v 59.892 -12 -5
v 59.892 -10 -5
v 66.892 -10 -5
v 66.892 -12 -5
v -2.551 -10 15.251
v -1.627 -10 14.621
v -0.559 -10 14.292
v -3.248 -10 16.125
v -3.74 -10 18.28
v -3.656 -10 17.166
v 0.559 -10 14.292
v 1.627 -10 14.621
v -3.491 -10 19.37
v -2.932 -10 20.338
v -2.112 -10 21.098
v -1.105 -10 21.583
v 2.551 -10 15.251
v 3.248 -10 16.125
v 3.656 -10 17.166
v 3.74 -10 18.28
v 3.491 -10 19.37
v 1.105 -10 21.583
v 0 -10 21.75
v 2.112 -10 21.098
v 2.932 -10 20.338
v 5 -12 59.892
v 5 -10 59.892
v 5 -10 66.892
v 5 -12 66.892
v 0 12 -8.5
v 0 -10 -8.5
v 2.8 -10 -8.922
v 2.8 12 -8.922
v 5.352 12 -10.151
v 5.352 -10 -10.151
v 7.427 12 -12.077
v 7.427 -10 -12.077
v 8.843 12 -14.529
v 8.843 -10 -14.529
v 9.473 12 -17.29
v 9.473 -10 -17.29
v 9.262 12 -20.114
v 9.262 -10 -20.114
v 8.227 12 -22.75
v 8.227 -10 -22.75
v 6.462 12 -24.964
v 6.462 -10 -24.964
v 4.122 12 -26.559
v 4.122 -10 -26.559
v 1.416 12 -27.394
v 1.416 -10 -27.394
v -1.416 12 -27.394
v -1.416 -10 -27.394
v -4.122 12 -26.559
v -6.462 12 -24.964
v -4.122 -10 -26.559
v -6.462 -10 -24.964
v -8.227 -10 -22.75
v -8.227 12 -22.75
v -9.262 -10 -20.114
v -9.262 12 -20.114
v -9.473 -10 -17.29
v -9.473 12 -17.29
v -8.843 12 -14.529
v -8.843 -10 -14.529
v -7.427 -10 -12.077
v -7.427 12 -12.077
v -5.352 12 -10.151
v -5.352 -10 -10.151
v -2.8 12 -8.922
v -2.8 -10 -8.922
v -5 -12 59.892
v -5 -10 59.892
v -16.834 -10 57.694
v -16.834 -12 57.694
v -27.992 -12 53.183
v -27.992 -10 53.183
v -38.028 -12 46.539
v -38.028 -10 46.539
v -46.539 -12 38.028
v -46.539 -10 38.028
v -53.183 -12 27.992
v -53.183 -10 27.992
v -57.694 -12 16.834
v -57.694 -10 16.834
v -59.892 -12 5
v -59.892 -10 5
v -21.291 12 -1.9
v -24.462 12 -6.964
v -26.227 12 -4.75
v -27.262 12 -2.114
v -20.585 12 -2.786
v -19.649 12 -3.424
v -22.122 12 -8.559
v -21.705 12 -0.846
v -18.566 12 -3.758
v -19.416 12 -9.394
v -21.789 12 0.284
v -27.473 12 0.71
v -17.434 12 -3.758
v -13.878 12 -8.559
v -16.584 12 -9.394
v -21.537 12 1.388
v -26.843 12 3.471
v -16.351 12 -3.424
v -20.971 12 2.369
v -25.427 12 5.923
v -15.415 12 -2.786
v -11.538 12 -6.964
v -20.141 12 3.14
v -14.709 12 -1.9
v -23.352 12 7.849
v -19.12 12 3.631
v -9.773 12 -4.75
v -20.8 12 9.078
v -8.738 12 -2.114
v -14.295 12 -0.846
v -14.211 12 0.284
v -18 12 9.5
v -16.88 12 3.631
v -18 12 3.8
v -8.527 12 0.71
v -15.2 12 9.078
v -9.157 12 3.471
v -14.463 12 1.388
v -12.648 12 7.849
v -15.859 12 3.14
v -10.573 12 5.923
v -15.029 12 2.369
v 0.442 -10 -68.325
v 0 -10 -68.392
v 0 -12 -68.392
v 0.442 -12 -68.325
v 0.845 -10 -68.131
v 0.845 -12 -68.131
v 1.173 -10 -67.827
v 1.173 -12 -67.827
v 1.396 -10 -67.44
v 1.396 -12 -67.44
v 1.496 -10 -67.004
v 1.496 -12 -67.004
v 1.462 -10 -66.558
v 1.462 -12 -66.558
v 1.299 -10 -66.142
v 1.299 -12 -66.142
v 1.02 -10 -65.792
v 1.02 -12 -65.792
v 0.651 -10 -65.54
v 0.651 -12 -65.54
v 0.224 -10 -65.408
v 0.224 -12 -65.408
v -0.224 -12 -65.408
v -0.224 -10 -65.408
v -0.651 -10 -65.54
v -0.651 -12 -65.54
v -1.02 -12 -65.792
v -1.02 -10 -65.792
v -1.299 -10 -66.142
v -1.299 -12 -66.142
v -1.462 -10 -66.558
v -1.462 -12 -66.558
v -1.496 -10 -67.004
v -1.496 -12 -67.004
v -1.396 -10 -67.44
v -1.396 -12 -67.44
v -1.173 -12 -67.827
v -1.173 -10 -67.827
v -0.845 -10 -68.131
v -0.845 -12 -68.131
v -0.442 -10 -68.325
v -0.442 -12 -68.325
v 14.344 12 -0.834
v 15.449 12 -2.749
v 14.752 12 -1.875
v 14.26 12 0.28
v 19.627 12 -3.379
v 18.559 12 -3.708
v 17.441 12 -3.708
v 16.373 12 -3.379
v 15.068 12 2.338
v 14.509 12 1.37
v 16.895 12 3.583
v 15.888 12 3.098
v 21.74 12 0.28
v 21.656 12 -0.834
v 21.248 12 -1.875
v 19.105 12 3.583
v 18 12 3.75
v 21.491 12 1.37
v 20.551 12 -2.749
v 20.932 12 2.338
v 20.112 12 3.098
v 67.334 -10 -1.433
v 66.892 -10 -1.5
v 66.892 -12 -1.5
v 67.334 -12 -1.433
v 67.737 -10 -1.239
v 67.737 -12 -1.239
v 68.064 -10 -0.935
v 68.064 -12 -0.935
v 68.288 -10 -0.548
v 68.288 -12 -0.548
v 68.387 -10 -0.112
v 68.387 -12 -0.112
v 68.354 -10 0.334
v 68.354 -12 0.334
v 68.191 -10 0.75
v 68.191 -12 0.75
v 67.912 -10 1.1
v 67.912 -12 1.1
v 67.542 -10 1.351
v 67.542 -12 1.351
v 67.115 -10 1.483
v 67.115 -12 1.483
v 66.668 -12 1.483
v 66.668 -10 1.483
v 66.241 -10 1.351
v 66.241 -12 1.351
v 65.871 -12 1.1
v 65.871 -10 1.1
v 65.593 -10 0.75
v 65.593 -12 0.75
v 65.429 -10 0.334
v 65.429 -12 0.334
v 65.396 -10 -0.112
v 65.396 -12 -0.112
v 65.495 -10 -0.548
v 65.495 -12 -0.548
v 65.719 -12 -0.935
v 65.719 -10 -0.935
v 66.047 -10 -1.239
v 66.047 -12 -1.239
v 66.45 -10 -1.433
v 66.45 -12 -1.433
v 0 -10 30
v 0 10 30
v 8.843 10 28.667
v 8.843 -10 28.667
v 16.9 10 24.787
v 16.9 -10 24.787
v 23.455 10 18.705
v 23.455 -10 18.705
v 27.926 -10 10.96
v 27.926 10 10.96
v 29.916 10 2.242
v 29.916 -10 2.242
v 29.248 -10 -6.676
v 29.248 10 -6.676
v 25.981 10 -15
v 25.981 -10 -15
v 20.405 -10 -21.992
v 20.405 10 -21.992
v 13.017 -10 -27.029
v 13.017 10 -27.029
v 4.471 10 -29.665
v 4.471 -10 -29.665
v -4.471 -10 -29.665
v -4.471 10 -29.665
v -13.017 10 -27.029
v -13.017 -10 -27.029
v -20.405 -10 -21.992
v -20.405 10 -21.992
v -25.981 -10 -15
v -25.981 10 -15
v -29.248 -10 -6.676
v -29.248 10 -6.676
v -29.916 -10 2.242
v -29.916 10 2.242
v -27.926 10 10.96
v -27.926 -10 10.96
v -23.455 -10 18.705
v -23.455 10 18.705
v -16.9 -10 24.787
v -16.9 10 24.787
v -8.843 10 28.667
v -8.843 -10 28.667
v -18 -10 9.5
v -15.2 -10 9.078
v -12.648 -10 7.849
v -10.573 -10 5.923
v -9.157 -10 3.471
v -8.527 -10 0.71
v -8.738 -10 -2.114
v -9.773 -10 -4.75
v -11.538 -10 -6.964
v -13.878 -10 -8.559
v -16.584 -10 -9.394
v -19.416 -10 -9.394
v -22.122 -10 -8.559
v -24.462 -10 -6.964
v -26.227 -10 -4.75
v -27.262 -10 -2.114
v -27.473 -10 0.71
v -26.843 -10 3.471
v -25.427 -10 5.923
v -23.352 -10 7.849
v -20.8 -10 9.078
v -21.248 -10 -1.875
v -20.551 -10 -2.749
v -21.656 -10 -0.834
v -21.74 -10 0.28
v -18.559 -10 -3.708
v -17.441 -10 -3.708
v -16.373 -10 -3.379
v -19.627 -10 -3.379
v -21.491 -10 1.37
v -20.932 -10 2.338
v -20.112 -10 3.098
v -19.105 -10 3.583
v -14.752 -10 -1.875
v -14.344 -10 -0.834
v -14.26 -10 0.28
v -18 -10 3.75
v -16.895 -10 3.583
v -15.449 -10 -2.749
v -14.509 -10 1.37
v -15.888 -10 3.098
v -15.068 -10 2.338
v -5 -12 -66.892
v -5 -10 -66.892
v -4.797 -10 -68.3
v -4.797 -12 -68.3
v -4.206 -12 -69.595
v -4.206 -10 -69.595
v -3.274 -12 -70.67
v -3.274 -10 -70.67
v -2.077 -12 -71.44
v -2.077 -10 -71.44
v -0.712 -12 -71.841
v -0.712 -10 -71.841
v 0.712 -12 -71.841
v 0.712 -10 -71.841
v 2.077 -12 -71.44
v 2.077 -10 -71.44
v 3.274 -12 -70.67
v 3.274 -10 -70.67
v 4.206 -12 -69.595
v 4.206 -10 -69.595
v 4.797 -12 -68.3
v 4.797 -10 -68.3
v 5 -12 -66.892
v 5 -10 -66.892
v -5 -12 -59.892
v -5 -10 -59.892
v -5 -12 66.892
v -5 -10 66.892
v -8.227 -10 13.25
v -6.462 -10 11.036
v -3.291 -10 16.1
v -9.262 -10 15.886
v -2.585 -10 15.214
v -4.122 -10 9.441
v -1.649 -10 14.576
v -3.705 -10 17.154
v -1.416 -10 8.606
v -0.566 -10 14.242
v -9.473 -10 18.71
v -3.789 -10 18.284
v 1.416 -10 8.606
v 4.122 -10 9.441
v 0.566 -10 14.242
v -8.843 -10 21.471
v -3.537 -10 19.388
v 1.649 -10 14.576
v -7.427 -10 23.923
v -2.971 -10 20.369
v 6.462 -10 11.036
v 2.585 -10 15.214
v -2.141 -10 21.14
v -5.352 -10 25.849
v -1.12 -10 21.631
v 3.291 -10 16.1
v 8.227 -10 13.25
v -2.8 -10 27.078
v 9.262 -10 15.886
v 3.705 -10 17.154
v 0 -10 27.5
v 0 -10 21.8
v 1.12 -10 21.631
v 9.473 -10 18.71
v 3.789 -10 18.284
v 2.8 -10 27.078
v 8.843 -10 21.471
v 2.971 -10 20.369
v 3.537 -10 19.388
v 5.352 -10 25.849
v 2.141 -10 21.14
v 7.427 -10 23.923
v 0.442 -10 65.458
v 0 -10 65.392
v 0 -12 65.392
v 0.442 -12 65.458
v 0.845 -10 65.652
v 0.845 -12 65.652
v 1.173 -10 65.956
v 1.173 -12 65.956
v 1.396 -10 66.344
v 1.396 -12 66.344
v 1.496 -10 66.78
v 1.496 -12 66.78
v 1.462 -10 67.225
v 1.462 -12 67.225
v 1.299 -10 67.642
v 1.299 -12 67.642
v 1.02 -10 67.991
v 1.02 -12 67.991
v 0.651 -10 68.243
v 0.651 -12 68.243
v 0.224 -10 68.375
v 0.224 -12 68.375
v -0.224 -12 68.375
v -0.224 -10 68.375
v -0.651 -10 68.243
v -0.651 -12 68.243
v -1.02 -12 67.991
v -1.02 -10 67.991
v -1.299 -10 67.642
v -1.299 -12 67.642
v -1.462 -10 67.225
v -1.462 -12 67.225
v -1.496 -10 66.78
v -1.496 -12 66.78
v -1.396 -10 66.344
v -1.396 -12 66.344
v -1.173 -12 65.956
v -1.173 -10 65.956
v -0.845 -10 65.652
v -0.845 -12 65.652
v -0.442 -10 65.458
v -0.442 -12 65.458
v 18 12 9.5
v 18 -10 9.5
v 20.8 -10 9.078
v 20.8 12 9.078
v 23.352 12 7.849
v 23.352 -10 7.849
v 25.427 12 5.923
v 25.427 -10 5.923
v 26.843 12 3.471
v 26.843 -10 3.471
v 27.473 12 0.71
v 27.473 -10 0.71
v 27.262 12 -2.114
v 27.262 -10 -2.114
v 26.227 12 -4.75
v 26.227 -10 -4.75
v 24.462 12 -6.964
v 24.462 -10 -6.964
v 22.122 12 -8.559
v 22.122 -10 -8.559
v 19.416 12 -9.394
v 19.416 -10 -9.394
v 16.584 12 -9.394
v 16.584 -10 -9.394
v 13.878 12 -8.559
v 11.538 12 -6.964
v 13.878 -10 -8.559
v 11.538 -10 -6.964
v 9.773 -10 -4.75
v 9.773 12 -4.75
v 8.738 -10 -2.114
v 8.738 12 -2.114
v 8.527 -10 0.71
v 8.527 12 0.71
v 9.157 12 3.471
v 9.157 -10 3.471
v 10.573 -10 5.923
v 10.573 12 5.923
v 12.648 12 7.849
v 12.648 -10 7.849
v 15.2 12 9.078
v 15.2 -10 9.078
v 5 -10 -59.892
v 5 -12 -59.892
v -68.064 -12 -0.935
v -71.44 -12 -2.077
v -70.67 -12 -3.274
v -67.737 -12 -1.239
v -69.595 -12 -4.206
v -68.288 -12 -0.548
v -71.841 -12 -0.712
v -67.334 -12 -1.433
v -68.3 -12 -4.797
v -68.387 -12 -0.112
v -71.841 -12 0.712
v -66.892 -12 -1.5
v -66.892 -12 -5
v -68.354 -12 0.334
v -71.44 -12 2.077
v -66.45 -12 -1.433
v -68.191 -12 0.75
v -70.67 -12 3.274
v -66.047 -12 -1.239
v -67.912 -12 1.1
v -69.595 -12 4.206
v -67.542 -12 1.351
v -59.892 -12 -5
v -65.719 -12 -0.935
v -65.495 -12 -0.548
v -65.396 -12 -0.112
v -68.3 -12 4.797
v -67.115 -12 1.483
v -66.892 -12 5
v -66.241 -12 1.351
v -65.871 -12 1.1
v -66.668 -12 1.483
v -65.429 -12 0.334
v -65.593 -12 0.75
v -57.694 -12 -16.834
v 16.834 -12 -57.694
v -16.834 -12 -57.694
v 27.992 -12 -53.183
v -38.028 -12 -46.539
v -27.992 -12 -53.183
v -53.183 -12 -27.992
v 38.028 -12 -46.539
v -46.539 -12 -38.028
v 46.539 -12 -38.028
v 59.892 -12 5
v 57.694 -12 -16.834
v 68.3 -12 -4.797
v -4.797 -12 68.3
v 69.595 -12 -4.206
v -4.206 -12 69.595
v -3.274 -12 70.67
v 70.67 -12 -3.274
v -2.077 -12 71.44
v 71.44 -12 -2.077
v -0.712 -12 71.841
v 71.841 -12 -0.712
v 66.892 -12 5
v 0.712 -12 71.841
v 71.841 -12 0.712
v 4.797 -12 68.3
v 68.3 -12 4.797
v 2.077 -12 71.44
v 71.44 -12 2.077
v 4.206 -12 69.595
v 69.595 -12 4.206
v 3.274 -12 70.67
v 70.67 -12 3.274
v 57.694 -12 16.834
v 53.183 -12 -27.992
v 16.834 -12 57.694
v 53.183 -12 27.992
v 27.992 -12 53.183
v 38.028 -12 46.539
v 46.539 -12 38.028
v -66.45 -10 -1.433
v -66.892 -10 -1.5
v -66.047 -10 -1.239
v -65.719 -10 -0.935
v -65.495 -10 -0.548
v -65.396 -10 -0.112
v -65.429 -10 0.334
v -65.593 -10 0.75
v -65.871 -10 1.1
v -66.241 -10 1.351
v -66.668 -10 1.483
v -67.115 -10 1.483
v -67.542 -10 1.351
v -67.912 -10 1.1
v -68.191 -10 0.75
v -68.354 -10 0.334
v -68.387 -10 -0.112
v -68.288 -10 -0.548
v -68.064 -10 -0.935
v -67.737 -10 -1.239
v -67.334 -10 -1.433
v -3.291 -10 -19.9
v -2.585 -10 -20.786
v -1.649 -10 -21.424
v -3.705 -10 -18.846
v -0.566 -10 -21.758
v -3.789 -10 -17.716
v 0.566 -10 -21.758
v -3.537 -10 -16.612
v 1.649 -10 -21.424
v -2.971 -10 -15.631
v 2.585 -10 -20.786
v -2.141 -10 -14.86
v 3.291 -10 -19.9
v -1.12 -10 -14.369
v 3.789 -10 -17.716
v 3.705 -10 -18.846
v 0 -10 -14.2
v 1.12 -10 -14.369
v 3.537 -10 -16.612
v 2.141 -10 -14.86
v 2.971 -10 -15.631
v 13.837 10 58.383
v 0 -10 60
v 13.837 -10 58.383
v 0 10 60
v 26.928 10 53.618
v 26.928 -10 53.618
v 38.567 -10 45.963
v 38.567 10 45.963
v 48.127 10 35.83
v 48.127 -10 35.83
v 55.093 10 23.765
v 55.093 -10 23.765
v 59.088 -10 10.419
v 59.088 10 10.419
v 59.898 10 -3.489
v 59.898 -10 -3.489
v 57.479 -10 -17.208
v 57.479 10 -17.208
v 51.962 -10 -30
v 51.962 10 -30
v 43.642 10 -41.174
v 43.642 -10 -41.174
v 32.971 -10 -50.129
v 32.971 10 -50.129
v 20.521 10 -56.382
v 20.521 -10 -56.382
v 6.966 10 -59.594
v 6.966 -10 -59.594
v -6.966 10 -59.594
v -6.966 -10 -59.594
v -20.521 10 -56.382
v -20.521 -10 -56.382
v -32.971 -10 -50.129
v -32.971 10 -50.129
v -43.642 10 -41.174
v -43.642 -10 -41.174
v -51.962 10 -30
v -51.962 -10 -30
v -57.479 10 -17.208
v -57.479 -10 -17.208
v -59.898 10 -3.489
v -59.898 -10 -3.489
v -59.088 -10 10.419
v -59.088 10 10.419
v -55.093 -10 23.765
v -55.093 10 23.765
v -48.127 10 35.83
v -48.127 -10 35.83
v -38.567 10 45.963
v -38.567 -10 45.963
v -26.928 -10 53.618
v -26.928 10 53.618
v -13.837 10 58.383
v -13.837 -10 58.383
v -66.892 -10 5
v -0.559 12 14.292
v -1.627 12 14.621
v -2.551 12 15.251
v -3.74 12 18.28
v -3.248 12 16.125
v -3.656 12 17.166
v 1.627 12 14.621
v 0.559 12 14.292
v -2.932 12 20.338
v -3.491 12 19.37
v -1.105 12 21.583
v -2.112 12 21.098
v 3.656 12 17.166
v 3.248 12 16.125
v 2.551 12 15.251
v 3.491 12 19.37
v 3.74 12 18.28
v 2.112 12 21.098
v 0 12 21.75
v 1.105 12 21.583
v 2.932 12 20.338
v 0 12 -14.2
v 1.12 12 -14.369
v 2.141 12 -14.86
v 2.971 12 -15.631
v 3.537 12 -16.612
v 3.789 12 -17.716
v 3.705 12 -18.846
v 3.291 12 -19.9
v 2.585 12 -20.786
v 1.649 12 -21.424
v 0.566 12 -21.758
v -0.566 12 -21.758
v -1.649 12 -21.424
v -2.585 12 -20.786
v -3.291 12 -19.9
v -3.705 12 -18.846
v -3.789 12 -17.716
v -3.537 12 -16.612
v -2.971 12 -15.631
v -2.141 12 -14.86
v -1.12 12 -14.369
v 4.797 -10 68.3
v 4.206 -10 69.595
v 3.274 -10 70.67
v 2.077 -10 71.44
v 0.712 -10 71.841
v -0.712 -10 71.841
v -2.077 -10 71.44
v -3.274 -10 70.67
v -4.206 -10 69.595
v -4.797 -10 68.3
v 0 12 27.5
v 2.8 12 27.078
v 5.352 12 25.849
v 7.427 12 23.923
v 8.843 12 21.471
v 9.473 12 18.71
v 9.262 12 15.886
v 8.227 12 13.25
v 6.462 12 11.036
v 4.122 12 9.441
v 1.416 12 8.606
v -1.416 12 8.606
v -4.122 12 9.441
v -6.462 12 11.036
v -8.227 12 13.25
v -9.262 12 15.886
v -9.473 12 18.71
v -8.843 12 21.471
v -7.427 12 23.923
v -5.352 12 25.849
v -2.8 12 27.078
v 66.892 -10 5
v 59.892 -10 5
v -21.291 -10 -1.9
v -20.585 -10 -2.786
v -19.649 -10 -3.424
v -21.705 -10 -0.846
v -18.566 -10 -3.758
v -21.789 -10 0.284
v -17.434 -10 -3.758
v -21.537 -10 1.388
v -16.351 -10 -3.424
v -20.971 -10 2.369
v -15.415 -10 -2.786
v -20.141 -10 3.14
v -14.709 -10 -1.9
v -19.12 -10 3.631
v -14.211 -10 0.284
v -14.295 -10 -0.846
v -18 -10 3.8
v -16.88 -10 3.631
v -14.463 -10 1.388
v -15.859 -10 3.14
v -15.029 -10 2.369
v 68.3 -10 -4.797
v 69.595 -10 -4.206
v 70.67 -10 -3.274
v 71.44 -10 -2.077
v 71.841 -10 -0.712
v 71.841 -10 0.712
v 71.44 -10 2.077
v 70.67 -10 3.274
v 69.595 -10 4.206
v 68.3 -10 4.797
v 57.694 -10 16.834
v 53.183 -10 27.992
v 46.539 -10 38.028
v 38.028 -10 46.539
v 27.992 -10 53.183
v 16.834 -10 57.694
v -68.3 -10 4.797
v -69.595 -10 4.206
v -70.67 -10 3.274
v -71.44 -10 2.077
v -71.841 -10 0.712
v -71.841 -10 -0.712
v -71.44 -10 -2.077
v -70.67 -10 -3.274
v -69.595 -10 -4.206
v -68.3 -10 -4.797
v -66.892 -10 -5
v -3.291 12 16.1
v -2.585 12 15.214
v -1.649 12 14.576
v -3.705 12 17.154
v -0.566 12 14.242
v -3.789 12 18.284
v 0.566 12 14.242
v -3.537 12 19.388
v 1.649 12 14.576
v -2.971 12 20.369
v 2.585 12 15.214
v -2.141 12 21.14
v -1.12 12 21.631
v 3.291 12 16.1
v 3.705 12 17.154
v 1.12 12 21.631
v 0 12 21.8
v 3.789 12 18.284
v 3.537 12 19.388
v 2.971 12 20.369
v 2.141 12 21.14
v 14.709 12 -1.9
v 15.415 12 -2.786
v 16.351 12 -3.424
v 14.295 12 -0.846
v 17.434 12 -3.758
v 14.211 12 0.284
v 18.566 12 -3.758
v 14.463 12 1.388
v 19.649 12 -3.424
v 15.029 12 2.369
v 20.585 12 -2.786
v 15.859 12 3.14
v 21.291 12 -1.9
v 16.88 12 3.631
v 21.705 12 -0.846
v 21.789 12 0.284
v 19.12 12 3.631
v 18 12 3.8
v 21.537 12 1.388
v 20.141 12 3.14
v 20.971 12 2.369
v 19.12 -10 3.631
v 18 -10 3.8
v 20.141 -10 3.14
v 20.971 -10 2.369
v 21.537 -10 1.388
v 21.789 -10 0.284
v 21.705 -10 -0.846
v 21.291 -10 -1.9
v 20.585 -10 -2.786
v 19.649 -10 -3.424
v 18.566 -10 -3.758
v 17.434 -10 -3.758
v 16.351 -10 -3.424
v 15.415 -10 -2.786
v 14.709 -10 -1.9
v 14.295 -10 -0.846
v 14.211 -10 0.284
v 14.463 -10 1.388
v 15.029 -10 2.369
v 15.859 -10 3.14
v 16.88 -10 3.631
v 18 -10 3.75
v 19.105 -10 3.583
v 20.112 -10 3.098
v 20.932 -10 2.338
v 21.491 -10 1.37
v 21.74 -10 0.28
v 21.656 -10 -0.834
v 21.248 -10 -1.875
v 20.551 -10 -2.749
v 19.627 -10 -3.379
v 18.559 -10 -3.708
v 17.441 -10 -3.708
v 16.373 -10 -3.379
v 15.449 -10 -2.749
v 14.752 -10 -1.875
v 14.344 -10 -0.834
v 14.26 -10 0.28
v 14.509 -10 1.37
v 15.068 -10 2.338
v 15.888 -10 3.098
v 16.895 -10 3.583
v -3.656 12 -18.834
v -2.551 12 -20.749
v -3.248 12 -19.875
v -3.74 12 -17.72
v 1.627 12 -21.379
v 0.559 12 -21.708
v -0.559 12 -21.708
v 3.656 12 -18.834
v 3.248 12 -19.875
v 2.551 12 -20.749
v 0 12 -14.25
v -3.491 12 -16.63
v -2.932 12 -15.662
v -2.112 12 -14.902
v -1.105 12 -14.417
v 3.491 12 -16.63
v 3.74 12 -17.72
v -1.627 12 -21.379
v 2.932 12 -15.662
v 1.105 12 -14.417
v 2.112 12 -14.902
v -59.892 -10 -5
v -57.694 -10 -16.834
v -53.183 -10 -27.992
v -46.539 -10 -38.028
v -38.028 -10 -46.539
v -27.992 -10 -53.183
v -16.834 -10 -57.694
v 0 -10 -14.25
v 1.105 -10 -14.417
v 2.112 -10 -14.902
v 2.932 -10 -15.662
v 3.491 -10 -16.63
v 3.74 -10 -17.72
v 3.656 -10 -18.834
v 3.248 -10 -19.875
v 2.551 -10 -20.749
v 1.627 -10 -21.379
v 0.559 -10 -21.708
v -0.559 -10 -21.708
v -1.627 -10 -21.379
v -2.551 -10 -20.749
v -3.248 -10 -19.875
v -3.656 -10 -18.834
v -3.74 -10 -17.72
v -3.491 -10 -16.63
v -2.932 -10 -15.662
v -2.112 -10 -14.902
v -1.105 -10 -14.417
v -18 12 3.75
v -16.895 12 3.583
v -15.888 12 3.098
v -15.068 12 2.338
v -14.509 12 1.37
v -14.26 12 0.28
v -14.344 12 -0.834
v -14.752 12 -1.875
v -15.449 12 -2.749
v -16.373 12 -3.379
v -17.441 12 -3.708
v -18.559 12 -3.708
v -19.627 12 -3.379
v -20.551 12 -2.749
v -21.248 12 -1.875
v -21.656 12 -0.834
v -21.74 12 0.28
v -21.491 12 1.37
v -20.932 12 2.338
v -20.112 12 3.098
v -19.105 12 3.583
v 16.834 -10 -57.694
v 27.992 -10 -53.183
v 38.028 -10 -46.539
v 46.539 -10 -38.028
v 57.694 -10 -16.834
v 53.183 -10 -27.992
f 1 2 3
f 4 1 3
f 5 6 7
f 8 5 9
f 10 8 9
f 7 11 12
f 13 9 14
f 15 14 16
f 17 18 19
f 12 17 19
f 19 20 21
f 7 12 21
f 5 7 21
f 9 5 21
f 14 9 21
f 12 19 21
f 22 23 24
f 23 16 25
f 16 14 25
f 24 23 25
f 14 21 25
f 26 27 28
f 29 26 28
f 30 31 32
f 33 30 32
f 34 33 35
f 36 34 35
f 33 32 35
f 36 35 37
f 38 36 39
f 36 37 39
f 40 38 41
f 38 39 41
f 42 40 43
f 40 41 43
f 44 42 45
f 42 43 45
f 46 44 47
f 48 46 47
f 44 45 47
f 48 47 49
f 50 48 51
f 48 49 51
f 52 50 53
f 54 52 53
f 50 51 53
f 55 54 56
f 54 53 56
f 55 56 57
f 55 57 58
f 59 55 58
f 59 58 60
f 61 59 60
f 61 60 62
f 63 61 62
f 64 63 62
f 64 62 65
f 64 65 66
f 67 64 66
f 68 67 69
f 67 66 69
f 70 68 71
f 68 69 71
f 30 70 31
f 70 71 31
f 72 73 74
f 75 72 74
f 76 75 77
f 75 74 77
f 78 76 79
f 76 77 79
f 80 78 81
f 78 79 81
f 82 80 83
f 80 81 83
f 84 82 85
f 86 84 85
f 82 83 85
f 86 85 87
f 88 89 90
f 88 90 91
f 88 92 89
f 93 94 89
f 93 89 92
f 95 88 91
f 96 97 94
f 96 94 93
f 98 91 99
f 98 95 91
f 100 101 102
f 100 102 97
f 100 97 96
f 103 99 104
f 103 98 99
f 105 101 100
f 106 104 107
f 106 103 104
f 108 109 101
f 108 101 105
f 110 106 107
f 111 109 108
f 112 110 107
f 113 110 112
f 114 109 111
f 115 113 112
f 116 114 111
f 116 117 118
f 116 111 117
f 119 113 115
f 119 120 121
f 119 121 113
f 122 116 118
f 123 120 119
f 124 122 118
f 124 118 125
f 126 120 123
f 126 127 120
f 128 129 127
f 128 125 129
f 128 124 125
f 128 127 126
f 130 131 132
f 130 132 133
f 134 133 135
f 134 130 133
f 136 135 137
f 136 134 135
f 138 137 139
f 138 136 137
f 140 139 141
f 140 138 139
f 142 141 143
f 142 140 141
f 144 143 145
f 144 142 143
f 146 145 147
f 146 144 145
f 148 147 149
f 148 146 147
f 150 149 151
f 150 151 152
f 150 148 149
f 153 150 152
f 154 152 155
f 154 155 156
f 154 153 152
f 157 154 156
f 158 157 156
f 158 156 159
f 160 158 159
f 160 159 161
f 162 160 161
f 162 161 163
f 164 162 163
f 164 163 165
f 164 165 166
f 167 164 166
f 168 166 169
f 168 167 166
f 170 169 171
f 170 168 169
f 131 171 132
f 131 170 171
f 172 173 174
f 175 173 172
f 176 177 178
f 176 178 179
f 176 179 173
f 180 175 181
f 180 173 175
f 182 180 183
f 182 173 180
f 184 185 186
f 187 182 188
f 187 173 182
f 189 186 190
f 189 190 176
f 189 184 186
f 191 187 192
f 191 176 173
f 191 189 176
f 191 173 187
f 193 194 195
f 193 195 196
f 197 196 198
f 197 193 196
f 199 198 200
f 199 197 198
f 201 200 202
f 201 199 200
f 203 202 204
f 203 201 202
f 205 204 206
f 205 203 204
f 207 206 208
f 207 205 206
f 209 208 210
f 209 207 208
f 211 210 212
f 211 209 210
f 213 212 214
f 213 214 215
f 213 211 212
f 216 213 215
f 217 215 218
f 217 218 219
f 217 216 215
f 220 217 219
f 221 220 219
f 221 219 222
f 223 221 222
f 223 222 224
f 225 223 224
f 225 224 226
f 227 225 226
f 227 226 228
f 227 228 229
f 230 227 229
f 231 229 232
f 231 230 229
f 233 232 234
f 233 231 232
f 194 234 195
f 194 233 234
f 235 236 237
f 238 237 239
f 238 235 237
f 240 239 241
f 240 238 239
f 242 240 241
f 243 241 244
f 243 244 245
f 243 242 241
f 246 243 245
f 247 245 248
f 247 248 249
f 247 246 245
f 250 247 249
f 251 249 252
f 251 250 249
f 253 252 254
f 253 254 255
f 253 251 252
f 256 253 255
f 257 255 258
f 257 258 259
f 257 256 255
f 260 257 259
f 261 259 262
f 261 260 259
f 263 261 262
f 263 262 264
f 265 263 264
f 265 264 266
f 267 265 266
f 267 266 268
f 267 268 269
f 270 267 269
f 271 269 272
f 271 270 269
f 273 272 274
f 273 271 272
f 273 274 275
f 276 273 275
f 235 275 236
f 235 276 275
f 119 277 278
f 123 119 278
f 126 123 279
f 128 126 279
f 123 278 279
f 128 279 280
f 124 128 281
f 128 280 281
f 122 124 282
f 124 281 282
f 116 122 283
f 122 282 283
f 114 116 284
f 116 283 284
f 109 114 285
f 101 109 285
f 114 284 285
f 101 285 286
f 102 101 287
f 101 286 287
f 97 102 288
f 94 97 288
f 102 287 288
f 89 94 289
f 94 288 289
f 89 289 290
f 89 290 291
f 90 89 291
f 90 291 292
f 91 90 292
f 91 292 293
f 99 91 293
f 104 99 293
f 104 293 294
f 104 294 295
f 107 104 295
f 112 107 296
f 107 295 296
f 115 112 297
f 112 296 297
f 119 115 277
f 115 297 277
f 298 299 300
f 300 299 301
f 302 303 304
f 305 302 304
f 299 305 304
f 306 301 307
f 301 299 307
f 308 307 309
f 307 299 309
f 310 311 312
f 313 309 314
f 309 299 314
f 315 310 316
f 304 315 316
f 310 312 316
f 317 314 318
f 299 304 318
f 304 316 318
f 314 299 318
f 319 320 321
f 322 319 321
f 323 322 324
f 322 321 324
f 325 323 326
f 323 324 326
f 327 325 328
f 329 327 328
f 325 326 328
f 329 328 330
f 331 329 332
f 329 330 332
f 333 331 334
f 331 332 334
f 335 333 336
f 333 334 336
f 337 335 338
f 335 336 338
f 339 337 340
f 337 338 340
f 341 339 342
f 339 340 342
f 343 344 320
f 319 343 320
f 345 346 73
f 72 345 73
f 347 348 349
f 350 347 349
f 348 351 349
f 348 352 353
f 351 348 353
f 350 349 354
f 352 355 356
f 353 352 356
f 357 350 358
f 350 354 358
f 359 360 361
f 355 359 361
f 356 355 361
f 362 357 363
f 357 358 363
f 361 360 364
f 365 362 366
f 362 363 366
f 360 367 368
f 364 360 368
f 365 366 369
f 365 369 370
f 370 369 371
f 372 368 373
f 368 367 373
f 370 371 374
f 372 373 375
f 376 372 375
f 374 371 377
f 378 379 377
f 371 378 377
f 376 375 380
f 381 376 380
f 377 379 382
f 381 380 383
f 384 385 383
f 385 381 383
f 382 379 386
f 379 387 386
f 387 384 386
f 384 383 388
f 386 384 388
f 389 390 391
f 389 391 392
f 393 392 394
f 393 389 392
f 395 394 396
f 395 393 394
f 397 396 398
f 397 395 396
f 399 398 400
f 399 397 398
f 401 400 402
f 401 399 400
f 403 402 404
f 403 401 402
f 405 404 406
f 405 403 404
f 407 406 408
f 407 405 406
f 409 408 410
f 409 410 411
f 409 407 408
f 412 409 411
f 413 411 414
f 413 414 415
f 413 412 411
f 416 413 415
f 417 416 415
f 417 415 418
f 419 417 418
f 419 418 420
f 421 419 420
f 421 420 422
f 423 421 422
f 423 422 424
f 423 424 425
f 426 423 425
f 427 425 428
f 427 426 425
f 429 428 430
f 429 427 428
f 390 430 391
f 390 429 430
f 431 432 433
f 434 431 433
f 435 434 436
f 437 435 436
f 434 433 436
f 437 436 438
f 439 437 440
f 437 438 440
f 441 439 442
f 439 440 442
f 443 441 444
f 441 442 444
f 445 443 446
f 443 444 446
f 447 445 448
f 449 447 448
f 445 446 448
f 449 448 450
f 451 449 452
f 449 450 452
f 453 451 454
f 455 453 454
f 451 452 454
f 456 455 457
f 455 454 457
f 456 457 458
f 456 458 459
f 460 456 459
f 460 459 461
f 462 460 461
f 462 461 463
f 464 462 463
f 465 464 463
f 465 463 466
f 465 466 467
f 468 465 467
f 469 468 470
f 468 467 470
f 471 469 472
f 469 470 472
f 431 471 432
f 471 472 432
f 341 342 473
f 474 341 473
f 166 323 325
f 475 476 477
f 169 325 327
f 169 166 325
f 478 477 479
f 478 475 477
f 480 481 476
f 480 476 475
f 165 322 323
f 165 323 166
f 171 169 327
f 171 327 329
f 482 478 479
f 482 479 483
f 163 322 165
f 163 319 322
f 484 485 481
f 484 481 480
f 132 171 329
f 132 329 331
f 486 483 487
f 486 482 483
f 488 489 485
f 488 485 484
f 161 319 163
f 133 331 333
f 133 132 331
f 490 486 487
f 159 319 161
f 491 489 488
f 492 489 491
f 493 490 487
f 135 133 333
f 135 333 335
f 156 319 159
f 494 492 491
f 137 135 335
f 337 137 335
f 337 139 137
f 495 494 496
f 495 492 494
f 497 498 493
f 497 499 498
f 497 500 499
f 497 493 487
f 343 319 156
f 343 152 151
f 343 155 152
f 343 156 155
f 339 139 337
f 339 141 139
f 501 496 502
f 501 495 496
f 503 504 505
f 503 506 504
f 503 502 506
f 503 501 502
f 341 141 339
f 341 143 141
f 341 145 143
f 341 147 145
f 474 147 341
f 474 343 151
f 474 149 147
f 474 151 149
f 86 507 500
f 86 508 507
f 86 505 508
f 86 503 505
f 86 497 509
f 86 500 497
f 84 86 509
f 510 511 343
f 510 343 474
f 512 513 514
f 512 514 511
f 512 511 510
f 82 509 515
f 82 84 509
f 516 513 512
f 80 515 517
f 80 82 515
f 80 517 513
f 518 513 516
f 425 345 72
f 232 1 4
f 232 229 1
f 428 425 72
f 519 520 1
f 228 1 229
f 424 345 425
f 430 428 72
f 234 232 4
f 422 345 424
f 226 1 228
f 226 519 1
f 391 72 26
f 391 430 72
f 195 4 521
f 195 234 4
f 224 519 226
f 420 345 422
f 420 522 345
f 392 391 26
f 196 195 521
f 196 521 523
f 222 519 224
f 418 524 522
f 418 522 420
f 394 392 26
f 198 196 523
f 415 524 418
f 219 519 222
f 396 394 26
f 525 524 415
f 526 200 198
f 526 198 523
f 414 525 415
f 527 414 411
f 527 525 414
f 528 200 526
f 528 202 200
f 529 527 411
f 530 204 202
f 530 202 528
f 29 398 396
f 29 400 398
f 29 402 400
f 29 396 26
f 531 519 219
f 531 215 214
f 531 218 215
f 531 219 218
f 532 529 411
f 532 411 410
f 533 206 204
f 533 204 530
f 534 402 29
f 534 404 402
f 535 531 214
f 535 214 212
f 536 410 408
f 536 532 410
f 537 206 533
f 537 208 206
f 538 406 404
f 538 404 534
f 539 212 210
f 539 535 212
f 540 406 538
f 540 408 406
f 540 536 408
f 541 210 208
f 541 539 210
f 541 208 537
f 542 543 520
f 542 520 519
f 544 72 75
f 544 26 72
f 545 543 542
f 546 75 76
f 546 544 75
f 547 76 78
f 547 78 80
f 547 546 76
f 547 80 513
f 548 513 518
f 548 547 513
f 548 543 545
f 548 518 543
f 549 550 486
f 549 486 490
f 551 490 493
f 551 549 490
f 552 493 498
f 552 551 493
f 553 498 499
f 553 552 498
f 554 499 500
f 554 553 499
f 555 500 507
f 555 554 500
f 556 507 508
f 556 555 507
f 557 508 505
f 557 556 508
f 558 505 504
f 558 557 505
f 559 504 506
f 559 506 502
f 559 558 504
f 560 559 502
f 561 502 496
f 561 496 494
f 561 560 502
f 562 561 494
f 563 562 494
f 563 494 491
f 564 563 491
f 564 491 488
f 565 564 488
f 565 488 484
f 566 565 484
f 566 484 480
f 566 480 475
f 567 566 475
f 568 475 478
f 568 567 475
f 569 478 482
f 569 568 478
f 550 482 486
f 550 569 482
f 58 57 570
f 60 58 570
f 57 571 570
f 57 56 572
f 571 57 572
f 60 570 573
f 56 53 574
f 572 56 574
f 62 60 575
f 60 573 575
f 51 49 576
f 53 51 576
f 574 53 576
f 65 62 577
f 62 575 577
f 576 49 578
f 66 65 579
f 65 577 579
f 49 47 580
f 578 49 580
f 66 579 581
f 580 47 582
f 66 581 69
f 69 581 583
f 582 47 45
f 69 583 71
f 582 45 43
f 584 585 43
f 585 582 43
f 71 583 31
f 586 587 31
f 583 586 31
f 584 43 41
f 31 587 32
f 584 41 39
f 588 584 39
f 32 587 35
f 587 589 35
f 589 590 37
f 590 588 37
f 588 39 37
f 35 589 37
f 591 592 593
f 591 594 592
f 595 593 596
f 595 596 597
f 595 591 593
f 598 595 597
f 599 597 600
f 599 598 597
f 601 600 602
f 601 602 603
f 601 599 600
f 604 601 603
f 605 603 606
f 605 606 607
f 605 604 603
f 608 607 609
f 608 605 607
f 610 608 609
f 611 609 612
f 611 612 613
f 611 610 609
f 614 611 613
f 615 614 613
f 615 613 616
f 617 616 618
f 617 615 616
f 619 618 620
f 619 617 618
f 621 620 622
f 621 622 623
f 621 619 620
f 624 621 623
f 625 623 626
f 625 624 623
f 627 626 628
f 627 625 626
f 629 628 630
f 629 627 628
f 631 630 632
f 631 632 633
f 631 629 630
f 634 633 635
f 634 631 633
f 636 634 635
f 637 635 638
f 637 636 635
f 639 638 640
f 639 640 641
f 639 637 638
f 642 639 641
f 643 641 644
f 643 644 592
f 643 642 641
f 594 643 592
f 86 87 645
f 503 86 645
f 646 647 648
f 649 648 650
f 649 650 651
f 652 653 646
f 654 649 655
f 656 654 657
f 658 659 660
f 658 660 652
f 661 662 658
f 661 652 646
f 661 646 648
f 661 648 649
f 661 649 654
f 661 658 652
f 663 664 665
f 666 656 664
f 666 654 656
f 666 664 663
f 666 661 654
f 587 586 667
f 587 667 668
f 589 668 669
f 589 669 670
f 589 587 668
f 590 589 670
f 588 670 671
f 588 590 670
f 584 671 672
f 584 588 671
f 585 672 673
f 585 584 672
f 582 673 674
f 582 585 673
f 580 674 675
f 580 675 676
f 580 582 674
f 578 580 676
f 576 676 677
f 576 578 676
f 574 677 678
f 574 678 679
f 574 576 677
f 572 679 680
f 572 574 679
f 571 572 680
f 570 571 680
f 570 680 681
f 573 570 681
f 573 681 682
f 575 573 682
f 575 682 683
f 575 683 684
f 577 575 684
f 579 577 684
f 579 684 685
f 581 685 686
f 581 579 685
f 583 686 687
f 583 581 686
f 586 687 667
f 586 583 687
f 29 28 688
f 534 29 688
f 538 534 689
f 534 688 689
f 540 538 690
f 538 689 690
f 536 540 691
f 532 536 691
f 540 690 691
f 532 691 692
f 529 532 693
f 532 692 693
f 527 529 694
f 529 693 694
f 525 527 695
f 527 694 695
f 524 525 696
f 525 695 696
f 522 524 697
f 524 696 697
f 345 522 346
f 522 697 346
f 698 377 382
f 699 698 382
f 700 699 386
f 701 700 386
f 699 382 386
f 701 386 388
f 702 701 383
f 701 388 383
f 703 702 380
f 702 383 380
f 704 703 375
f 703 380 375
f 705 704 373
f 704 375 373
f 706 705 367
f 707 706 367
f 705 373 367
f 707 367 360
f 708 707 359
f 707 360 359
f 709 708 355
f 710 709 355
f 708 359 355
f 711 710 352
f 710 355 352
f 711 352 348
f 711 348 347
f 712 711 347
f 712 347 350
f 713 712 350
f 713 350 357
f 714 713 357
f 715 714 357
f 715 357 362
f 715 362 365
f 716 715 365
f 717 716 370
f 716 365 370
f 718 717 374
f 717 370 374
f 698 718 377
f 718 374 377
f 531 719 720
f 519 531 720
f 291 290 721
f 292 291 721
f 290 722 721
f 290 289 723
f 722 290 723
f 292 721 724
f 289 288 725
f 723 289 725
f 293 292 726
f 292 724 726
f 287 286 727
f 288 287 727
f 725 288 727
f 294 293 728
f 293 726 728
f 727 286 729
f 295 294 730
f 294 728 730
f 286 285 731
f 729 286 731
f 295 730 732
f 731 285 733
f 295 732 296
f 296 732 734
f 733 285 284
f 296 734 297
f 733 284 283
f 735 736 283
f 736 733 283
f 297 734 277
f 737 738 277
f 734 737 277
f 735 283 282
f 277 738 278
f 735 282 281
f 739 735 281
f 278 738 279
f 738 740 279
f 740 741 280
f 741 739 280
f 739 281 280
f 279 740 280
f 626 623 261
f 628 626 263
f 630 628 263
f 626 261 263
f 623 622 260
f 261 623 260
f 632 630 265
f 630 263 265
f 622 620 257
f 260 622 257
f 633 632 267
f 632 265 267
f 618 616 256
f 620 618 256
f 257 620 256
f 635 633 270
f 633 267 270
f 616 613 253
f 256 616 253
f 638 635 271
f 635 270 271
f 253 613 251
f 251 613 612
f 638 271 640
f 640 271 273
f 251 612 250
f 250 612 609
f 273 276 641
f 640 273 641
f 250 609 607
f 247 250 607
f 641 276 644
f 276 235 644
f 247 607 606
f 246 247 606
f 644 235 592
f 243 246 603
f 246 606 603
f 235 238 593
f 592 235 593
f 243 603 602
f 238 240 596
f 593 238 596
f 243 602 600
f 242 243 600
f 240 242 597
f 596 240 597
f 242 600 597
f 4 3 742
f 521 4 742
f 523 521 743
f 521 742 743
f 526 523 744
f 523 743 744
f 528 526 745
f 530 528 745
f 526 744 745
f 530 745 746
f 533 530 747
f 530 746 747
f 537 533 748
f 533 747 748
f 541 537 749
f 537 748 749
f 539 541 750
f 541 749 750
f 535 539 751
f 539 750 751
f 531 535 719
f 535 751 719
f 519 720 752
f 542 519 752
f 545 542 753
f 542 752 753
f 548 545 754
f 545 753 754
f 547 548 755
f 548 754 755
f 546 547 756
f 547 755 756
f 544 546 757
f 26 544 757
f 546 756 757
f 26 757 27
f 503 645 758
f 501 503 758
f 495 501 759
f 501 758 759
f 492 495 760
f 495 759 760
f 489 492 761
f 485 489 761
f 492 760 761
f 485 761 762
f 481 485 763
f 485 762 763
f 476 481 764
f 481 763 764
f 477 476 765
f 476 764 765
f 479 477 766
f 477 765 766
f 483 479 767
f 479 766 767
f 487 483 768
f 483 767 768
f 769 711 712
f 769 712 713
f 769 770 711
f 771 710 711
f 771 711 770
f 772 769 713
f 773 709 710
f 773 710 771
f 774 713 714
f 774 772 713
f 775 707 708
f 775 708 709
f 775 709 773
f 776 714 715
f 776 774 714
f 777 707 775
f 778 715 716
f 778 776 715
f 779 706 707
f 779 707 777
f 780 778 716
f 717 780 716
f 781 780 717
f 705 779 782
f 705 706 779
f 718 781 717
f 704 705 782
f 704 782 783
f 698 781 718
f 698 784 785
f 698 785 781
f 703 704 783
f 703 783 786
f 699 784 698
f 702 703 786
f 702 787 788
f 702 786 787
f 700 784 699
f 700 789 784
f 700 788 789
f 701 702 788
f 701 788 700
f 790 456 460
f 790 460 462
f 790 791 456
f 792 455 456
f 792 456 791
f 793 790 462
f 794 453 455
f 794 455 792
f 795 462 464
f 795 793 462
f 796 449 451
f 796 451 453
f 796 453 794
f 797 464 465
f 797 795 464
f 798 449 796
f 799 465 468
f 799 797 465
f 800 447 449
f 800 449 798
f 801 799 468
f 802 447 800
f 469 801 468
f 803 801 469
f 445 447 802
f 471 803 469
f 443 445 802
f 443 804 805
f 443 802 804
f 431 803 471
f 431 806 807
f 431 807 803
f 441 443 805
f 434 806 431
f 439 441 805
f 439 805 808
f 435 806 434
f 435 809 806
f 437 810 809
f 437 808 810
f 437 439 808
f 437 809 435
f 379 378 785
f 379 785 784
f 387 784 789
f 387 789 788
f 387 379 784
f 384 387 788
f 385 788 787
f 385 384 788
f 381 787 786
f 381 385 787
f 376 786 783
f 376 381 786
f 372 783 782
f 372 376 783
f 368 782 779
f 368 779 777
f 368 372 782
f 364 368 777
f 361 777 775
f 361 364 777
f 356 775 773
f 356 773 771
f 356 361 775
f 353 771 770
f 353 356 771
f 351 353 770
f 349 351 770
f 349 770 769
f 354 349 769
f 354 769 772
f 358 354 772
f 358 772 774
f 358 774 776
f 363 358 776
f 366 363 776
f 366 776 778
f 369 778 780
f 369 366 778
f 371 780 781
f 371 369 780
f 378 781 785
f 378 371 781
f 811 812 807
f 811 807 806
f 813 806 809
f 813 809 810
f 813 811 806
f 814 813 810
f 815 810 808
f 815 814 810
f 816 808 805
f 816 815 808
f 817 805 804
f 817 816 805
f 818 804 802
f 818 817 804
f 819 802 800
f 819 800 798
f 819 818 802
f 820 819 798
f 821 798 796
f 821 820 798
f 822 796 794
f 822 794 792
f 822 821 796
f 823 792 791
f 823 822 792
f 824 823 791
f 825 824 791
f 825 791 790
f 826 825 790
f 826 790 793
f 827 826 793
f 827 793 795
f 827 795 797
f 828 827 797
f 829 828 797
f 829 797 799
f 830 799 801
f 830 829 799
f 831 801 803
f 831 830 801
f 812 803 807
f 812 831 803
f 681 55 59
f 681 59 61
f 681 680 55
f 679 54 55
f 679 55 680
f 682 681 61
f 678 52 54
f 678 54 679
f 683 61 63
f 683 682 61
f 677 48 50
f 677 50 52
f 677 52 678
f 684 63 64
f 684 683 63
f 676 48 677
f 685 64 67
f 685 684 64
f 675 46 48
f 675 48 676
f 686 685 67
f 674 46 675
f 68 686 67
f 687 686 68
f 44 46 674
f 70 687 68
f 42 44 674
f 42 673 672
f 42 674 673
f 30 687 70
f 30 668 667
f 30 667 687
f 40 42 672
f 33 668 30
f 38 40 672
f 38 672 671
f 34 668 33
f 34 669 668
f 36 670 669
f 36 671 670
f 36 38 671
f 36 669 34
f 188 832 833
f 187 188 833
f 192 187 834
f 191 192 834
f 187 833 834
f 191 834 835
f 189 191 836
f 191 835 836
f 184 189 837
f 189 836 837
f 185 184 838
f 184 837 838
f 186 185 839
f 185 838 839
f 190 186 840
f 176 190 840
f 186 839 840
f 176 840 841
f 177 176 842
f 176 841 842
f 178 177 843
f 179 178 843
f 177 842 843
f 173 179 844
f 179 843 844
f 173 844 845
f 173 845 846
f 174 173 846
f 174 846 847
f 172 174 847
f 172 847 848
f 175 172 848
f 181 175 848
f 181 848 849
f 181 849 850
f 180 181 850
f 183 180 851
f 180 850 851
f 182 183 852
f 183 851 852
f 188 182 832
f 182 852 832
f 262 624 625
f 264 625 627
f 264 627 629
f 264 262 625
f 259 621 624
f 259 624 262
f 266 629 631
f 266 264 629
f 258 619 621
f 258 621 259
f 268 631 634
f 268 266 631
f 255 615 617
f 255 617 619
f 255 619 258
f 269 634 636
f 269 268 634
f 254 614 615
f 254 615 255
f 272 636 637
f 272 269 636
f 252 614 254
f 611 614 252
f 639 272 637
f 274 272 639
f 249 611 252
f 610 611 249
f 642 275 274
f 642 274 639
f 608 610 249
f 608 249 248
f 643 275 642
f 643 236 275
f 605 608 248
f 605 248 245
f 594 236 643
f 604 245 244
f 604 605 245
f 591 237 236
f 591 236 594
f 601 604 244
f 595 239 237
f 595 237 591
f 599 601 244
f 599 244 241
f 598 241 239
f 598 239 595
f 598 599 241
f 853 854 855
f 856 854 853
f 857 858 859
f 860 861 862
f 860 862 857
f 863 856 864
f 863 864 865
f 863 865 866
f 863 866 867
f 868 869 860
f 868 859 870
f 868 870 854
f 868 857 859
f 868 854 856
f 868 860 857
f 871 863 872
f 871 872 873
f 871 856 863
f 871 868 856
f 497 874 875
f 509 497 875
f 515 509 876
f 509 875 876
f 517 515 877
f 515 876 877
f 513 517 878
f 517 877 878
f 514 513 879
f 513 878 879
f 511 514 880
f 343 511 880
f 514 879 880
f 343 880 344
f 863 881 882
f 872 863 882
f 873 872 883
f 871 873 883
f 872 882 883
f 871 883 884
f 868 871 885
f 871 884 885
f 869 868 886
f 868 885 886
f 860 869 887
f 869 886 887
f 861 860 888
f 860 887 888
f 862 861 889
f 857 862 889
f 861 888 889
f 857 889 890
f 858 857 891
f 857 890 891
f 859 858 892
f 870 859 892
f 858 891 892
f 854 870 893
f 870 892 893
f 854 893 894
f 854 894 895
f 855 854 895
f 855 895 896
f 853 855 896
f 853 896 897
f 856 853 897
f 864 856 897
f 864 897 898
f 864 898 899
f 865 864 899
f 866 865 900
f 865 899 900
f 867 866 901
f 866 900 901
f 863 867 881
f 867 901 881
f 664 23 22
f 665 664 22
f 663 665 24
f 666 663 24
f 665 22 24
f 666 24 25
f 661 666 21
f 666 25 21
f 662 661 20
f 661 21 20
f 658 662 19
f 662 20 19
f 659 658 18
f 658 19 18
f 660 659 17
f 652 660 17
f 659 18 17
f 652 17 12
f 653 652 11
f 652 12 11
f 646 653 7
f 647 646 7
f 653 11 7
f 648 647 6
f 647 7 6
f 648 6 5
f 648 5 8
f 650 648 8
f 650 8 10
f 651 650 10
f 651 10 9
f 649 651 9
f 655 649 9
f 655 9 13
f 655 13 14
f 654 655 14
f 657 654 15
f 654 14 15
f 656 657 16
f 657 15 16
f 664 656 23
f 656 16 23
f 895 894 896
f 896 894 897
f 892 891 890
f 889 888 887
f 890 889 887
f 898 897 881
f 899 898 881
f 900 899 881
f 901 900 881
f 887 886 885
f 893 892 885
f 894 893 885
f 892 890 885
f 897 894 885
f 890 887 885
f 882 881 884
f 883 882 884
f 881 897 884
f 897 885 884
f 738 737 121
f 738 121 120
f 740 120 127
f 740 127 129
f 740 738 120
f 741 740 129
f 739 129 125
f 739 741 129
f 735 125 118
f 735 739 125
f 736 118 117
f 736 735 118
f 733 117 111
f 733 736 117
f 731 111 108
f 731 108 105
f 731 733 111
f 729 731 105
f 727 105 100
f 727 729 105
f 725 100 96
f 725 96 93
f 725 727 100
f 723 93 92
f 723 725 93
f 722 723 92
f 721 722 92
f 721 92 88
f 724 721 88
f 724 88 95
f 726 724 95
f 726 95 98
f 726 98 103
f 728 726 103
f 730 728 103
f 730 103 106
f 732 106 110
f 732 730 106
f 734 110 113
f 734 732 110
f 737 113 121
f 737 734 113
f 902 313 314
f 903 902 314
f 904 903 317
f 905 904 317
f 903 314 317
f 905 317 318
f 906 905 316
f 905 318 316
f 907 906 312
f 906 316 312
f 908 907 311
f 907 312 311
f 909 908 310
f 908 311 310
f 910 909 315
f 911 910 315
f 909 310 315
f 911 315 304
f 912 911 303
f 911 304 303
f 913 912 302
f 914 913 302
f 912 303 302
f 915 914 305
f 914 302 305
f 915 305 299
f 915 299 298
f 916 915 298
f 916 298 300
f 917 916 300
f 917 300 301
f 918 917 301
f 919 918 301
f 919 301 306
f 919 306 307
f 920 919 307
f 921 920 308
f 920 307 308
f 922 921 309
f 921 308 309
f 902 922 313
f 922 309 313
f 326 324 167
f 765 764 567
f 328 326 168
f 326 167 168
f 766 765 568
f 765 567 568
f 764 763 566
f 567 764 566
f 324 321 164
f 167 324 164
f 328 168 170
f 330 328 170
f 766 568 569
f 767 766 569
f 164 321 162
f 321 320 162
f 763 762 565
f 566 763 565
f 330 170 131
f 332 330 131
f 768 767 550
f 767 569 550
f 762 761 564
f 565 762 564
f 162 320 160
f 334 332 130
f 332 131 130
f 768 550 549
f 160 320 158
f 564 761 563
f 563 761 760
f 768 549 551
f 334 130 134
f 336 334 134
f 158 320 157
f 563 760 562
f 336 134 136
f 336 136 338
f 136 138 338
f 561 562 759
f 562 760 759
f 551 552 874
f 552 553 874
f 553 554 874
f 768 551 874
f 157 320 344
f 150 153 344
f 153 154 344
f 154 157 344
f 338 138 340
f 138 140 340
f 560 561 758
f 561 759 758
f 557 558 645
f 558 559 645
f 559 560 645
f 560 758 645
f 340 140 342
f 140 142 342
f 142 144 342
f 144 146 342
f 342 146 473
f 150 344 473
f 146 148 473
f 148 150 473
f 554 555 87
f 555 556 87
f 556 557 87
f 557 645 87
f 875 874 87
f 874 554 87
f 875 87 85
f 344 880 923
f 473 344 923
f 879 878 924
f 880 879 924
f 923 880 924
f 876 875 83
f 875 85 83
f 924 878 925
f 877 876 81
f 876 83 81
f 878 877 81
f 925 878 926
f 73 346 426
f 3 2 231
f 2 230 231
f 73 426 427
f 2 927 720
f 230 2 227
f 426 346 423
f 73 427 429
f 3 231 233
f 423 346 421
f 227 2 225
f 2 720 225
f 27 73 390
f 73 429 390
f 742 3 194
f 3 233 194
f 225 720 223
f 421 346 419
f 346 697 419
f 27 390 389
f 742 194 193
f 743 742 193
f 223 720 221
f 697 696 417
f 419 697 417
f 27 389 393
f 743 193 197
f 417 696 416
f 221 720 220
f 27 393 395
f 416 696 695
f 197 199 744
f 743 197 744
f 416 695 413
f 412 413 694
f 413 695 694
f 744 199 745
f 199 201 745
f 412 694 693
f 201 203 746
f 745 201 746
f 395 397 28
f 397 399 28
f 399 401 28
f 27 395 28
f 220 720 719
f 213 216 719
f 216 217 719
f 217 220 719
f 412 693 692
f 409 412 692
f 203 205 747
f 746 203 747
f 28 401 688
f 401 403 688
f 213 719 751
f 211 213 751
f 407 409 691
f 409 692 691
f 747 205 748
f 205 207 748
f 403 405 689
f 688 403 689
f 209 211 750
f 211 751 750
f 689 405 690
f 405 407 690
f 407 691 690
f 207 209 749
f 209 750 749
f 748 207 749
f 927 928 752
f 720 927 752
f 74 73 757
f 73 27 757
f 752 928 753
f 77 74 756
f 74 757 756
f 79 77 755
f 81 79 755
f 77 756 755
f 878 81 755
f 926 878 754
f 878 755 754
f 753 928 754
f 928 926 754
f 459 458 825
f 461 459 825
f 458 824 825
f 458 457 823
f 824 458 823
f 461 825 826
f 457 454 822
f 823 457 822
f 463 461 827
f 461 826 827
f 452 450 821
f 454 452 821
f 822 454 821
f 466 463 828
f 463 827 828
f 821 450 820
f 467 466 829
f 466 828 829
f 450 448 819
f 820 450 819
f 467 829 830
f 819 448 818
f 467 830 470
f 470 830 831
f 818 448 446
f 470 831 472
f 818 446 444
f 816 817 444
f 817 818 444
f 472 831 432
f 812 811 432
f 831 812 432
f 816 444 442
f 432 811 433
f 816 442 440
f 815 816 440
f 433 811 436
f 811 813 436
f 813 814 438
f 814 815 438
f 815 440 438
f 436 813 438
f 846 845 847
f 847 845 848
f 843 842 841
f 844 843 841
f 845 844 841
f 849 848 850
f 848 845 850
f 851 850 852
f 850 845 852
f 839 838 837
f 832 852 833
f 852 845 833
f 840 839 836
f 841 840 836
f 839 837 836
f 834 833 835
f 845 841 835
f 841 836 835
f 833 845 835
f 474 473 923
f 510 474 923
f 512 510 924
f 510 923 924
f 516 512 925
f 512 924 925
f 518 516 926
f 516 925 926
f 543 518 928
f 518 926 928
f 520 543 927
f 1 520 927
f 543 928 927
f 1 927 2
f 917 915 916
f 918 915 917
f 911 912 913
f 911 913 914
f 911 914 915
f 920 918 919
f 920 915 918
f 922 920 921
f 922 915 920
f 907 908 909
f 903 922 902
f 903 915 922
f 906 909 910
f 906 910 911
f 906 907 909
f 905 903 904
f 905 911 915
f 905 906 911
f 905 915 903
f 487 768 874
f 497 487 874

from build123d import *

# Parameters (mm, degrees)
SKETCH1_R             = 60
SKETCH1_R_2           = 30
BOSS_EXTRUDE1_DEPTH   = 10
SKETCH2_R             = 1.5
BOSS_EXTRUDE2_DEPTH   = 2
SKETCH3_R             = 9.5
SKETCH3_R_2           = 3.8
BOSS_EXTRUDE3_DEPTH   = 22
BOSS_EXTRUDE3_2_DEPTH = 22
SKETCH3_R_3           = 3.75
BOSS_EXTRUDE3_3_DEPTH = 22
BOSS_EXTRUDE3_4_DEPTH = 22
BOSS_EXTRUDE3_5_DEPTH = 22
BOSS_EXTRUDE3_6_DEPTH = 22
BOSS_EXTRUDE3_7_DEPTH = 22
BOSS_EXTRUDE3_8_DEPTH = 22


with BuildPart() as part:
    # Sketch1 → Boss-Extrude1 (new, symmetric)
    with BuildSketch(Plane(origin=(0, 0, 0), x_dir=(1, 0, 0), z_dir=(0, 1, 0))):
        with Locations(Location((0, 0, 0), (0, 0, 270))):
            Circle(SKETCH1_R)
        with Locations(Location((0, 0, 0), (0, 0, 270))):
            Circle(SKETCH1_R_2, mode=Mode.SUBTRACT)
    extrude(amount=BOSS_EXTRUDE1_DEPTH, both=True)


with BuildPart() as body_2:
    # Sketch2 → Boss-Extrude2 (new body)
    with BuildSketch(Plane.XZ.offset(10)):
        with BuildLine():
            Line((-5, 66.891652173), (-5, 59.891652173))
            ThreePointArc((-5, 59.891652173), (-42.497117549, 42.497117549), (-59.891652173, 5))
            Line((-59.891652173, 5), (-66.891652173, 5))
            ThreePointArc((-66.891652173, 5), (-71.891652173, 0), (-66.891652173, -5))
            Line((-66.891652173, -5), (-59.891652173, -5))
            ThreePointArc((-59.891652173, -5), (-42.497117549, -42.497117549), (-5, -59.891652173))
            Line((-5, -59.891652173), (-5, -66.891652173))
            ThreePointArc((-5, -66.891652173), (0, -71.891652173), (5, -66.891652173))
            Line((5, -66.891652173), (5, -59.891652173))
            ThreePointArc((5, -59.891652173), (42.497117549, -42.497117549), (59.891652173, -5))
            Line((59.891652173, -5), (66.891652173, -5))
            ThreePointArc((66.891652173, -5), (71.891652173, 0), (66.891652173, 5))
            Line((66.891652173, 5), (59.891652173, 5))
            ThreePointArc((59.891652173, 5), (42.497117549, 42.497117549), (5, 59.891652173))
            Line((5, 59.891652173), (5, 66.891652173))
            ThreePointArc((5, 66.891652173), (0, 71.891652173), (-5, 66.891652173))
        make_face()
        with Locations(Location((0, 66.891652173, 0), (0, 0, 270))):
            Circle(SKETCH2_R, mode=Mode.SUBTRACT)
        with Locations(Location((66.891652173, 0, 0), (0, 0, 270))):
            Circle(SKETCH2_R, mode=Mode.SUBTRACT)
        with Locations(Location((0, -66.891652173, 0), (0, 0, 270))):
            Circle(SKETCH2_R, mode=Mode.SUBTRACT)
        with Locations(Location((-66.891652173, 0, 0), (0, 0, 270))):
            Circle(SKETCH2_R, mode=Mode.SUBTRACT)
    extrude(amount=BOSS_EXTRUDE2_DEPTH)


with BuildPart() as body_3:
    # Sketch3 → Boss-Extrude3 (new body)
    with BuildSketch(Plane(origin=(0, -10, 0), x_dir=(1, 0, 0), z_dir=(0, 1, 0))):
        with Locations(Location((0, 18, 0), (0, 0, 270))):
            Circle(SKETCH3_R)
        with Locations(Location((0, 18, 0), (0, 0, 270))):
            Circle(SKETCH3_R_2, mode=Mode.SUBTRACT)
    extrude(amount=BOSS_EXTRUDE3_DEPTH)


with BuildPart() as body_4:
    # Sketch3 → Boss-Extrude3 2 (new body)
    with BuildSketch(Plane(origin=(0, -10, 0), x_dir=(1, 0, 0), z_dir=(0, 1, 0))):
        with Locations(Location((-18, 0, 0), (0, 0, 270))):
            Circle(SKETCH3_R)
        with Locations(Location((-18, 0, 0), (0, 0, 270))):
            Circle(SKETCH3_R_2, mode=Mode.SUBTRACT)
    extrude(amount=BOSS_EXTRUDE3_2_DEPTH)


with BuildPart() as body_5:
    # Sketch3 → Boss-Extrude3 3 (new body)
    with BuildSketch(Plane(origin=(0, -10, 0), x_dir=(1, 0, 0), z_dir=(0, 1, 0))):
        with Locations(Location((-18, 0, 0), (0, 0, 270))):
            Circle(SKETCH3_R_3)
    extrude(amount=BOSS_EXTRUDE3_3_DEPTH)


with BuildPart() as body_6:
    # Sketch3 → Boss-Extrude3 4 (new body)
    with BuildSketch(Plane(origin=(0, -10, 0), x_dir=(1, 0, 0), z_dir=(0, 1, 0))):
        with Locations(Location((0, -18, 0), (0, 0, 270))):
            Circle(SKETCH3_R)
        with Locations(Location((0, -18, 0), (0, 0, 270))):
            Circle(SKETCH3_R_2, mode=Mode.SUBTRACT)
    extrude(amount=BOSS_EXTRUDE3_4_DEPTH)


with BuildPart() as body_7:
    # Sketch3 → Boss-Extrude3 5 (new body)
    with BuildSketch(Plane(origin=(0, -10, 0), x_dir=(1, 0, 0), z_dir=(0, 1, 0))):
        with Locations(Location((0, -18, 0), (0, 0, 270))):
            Circle(SKETCH3_R_3)
    extrude(amount=BOSS_EXTRUDE3_5_DEPTH)


with BuildPart() as body_8:
    # Sketch3 → Boss-Extrude3 6 (new body)
    with BuildSketch(Plane(origin=(0, -10, 0), x_dir=(1, 0, 0), z_dir=(0, 1, 0))):
        with Locations(Location((18, 0, 0), (0, 0, 270))):
            Circle(SKETCH3_R_3)
    extrude(amount=BOSS_EXTRUDE3_6_DEPTH)


with BuildPart() as body_9:
    # Sketch3 → Boss-Extrude3 7 (new body)
    with BuildSketch(Plane(origin=(0, -10, 0), x_dir=(1, 0, 0), z_dir=(0, 1, 0))):
        with Locations(Location((18, 0, 0), (0, 0, 270))):
            Circle(SKETCH3_R)
        with Locations(Location((18, 0, 0), (0, 0, 270))):
            Circle(SKETCH3_R_2, mode=Mode.SUBTRACT)
    extrude(amount=BOSS_EXTRUDE3_7_DEPTH)


with BuildPart() as body_10:
    # Sketch3 → Boss-Extrude3 8 (new body)
    with BuildSketch(Plane(origin=(0, -10, 0), x_dir=(1, 0, 0), z_dir=(0, 1, 0))):
        with Locations(Location((0, 18, 0), (0, 0, 270))):
            Circle(SKETCH3_R_3)
    extrude(amount=BOSS_EXTRUDE3_8_DEPTH)


solid = Compound([part.part, body_2.part, body_3.part, body_4.part, body_5.part, body_6.part, body_7.part, body_8.part, body_9.part, body_10.part])
